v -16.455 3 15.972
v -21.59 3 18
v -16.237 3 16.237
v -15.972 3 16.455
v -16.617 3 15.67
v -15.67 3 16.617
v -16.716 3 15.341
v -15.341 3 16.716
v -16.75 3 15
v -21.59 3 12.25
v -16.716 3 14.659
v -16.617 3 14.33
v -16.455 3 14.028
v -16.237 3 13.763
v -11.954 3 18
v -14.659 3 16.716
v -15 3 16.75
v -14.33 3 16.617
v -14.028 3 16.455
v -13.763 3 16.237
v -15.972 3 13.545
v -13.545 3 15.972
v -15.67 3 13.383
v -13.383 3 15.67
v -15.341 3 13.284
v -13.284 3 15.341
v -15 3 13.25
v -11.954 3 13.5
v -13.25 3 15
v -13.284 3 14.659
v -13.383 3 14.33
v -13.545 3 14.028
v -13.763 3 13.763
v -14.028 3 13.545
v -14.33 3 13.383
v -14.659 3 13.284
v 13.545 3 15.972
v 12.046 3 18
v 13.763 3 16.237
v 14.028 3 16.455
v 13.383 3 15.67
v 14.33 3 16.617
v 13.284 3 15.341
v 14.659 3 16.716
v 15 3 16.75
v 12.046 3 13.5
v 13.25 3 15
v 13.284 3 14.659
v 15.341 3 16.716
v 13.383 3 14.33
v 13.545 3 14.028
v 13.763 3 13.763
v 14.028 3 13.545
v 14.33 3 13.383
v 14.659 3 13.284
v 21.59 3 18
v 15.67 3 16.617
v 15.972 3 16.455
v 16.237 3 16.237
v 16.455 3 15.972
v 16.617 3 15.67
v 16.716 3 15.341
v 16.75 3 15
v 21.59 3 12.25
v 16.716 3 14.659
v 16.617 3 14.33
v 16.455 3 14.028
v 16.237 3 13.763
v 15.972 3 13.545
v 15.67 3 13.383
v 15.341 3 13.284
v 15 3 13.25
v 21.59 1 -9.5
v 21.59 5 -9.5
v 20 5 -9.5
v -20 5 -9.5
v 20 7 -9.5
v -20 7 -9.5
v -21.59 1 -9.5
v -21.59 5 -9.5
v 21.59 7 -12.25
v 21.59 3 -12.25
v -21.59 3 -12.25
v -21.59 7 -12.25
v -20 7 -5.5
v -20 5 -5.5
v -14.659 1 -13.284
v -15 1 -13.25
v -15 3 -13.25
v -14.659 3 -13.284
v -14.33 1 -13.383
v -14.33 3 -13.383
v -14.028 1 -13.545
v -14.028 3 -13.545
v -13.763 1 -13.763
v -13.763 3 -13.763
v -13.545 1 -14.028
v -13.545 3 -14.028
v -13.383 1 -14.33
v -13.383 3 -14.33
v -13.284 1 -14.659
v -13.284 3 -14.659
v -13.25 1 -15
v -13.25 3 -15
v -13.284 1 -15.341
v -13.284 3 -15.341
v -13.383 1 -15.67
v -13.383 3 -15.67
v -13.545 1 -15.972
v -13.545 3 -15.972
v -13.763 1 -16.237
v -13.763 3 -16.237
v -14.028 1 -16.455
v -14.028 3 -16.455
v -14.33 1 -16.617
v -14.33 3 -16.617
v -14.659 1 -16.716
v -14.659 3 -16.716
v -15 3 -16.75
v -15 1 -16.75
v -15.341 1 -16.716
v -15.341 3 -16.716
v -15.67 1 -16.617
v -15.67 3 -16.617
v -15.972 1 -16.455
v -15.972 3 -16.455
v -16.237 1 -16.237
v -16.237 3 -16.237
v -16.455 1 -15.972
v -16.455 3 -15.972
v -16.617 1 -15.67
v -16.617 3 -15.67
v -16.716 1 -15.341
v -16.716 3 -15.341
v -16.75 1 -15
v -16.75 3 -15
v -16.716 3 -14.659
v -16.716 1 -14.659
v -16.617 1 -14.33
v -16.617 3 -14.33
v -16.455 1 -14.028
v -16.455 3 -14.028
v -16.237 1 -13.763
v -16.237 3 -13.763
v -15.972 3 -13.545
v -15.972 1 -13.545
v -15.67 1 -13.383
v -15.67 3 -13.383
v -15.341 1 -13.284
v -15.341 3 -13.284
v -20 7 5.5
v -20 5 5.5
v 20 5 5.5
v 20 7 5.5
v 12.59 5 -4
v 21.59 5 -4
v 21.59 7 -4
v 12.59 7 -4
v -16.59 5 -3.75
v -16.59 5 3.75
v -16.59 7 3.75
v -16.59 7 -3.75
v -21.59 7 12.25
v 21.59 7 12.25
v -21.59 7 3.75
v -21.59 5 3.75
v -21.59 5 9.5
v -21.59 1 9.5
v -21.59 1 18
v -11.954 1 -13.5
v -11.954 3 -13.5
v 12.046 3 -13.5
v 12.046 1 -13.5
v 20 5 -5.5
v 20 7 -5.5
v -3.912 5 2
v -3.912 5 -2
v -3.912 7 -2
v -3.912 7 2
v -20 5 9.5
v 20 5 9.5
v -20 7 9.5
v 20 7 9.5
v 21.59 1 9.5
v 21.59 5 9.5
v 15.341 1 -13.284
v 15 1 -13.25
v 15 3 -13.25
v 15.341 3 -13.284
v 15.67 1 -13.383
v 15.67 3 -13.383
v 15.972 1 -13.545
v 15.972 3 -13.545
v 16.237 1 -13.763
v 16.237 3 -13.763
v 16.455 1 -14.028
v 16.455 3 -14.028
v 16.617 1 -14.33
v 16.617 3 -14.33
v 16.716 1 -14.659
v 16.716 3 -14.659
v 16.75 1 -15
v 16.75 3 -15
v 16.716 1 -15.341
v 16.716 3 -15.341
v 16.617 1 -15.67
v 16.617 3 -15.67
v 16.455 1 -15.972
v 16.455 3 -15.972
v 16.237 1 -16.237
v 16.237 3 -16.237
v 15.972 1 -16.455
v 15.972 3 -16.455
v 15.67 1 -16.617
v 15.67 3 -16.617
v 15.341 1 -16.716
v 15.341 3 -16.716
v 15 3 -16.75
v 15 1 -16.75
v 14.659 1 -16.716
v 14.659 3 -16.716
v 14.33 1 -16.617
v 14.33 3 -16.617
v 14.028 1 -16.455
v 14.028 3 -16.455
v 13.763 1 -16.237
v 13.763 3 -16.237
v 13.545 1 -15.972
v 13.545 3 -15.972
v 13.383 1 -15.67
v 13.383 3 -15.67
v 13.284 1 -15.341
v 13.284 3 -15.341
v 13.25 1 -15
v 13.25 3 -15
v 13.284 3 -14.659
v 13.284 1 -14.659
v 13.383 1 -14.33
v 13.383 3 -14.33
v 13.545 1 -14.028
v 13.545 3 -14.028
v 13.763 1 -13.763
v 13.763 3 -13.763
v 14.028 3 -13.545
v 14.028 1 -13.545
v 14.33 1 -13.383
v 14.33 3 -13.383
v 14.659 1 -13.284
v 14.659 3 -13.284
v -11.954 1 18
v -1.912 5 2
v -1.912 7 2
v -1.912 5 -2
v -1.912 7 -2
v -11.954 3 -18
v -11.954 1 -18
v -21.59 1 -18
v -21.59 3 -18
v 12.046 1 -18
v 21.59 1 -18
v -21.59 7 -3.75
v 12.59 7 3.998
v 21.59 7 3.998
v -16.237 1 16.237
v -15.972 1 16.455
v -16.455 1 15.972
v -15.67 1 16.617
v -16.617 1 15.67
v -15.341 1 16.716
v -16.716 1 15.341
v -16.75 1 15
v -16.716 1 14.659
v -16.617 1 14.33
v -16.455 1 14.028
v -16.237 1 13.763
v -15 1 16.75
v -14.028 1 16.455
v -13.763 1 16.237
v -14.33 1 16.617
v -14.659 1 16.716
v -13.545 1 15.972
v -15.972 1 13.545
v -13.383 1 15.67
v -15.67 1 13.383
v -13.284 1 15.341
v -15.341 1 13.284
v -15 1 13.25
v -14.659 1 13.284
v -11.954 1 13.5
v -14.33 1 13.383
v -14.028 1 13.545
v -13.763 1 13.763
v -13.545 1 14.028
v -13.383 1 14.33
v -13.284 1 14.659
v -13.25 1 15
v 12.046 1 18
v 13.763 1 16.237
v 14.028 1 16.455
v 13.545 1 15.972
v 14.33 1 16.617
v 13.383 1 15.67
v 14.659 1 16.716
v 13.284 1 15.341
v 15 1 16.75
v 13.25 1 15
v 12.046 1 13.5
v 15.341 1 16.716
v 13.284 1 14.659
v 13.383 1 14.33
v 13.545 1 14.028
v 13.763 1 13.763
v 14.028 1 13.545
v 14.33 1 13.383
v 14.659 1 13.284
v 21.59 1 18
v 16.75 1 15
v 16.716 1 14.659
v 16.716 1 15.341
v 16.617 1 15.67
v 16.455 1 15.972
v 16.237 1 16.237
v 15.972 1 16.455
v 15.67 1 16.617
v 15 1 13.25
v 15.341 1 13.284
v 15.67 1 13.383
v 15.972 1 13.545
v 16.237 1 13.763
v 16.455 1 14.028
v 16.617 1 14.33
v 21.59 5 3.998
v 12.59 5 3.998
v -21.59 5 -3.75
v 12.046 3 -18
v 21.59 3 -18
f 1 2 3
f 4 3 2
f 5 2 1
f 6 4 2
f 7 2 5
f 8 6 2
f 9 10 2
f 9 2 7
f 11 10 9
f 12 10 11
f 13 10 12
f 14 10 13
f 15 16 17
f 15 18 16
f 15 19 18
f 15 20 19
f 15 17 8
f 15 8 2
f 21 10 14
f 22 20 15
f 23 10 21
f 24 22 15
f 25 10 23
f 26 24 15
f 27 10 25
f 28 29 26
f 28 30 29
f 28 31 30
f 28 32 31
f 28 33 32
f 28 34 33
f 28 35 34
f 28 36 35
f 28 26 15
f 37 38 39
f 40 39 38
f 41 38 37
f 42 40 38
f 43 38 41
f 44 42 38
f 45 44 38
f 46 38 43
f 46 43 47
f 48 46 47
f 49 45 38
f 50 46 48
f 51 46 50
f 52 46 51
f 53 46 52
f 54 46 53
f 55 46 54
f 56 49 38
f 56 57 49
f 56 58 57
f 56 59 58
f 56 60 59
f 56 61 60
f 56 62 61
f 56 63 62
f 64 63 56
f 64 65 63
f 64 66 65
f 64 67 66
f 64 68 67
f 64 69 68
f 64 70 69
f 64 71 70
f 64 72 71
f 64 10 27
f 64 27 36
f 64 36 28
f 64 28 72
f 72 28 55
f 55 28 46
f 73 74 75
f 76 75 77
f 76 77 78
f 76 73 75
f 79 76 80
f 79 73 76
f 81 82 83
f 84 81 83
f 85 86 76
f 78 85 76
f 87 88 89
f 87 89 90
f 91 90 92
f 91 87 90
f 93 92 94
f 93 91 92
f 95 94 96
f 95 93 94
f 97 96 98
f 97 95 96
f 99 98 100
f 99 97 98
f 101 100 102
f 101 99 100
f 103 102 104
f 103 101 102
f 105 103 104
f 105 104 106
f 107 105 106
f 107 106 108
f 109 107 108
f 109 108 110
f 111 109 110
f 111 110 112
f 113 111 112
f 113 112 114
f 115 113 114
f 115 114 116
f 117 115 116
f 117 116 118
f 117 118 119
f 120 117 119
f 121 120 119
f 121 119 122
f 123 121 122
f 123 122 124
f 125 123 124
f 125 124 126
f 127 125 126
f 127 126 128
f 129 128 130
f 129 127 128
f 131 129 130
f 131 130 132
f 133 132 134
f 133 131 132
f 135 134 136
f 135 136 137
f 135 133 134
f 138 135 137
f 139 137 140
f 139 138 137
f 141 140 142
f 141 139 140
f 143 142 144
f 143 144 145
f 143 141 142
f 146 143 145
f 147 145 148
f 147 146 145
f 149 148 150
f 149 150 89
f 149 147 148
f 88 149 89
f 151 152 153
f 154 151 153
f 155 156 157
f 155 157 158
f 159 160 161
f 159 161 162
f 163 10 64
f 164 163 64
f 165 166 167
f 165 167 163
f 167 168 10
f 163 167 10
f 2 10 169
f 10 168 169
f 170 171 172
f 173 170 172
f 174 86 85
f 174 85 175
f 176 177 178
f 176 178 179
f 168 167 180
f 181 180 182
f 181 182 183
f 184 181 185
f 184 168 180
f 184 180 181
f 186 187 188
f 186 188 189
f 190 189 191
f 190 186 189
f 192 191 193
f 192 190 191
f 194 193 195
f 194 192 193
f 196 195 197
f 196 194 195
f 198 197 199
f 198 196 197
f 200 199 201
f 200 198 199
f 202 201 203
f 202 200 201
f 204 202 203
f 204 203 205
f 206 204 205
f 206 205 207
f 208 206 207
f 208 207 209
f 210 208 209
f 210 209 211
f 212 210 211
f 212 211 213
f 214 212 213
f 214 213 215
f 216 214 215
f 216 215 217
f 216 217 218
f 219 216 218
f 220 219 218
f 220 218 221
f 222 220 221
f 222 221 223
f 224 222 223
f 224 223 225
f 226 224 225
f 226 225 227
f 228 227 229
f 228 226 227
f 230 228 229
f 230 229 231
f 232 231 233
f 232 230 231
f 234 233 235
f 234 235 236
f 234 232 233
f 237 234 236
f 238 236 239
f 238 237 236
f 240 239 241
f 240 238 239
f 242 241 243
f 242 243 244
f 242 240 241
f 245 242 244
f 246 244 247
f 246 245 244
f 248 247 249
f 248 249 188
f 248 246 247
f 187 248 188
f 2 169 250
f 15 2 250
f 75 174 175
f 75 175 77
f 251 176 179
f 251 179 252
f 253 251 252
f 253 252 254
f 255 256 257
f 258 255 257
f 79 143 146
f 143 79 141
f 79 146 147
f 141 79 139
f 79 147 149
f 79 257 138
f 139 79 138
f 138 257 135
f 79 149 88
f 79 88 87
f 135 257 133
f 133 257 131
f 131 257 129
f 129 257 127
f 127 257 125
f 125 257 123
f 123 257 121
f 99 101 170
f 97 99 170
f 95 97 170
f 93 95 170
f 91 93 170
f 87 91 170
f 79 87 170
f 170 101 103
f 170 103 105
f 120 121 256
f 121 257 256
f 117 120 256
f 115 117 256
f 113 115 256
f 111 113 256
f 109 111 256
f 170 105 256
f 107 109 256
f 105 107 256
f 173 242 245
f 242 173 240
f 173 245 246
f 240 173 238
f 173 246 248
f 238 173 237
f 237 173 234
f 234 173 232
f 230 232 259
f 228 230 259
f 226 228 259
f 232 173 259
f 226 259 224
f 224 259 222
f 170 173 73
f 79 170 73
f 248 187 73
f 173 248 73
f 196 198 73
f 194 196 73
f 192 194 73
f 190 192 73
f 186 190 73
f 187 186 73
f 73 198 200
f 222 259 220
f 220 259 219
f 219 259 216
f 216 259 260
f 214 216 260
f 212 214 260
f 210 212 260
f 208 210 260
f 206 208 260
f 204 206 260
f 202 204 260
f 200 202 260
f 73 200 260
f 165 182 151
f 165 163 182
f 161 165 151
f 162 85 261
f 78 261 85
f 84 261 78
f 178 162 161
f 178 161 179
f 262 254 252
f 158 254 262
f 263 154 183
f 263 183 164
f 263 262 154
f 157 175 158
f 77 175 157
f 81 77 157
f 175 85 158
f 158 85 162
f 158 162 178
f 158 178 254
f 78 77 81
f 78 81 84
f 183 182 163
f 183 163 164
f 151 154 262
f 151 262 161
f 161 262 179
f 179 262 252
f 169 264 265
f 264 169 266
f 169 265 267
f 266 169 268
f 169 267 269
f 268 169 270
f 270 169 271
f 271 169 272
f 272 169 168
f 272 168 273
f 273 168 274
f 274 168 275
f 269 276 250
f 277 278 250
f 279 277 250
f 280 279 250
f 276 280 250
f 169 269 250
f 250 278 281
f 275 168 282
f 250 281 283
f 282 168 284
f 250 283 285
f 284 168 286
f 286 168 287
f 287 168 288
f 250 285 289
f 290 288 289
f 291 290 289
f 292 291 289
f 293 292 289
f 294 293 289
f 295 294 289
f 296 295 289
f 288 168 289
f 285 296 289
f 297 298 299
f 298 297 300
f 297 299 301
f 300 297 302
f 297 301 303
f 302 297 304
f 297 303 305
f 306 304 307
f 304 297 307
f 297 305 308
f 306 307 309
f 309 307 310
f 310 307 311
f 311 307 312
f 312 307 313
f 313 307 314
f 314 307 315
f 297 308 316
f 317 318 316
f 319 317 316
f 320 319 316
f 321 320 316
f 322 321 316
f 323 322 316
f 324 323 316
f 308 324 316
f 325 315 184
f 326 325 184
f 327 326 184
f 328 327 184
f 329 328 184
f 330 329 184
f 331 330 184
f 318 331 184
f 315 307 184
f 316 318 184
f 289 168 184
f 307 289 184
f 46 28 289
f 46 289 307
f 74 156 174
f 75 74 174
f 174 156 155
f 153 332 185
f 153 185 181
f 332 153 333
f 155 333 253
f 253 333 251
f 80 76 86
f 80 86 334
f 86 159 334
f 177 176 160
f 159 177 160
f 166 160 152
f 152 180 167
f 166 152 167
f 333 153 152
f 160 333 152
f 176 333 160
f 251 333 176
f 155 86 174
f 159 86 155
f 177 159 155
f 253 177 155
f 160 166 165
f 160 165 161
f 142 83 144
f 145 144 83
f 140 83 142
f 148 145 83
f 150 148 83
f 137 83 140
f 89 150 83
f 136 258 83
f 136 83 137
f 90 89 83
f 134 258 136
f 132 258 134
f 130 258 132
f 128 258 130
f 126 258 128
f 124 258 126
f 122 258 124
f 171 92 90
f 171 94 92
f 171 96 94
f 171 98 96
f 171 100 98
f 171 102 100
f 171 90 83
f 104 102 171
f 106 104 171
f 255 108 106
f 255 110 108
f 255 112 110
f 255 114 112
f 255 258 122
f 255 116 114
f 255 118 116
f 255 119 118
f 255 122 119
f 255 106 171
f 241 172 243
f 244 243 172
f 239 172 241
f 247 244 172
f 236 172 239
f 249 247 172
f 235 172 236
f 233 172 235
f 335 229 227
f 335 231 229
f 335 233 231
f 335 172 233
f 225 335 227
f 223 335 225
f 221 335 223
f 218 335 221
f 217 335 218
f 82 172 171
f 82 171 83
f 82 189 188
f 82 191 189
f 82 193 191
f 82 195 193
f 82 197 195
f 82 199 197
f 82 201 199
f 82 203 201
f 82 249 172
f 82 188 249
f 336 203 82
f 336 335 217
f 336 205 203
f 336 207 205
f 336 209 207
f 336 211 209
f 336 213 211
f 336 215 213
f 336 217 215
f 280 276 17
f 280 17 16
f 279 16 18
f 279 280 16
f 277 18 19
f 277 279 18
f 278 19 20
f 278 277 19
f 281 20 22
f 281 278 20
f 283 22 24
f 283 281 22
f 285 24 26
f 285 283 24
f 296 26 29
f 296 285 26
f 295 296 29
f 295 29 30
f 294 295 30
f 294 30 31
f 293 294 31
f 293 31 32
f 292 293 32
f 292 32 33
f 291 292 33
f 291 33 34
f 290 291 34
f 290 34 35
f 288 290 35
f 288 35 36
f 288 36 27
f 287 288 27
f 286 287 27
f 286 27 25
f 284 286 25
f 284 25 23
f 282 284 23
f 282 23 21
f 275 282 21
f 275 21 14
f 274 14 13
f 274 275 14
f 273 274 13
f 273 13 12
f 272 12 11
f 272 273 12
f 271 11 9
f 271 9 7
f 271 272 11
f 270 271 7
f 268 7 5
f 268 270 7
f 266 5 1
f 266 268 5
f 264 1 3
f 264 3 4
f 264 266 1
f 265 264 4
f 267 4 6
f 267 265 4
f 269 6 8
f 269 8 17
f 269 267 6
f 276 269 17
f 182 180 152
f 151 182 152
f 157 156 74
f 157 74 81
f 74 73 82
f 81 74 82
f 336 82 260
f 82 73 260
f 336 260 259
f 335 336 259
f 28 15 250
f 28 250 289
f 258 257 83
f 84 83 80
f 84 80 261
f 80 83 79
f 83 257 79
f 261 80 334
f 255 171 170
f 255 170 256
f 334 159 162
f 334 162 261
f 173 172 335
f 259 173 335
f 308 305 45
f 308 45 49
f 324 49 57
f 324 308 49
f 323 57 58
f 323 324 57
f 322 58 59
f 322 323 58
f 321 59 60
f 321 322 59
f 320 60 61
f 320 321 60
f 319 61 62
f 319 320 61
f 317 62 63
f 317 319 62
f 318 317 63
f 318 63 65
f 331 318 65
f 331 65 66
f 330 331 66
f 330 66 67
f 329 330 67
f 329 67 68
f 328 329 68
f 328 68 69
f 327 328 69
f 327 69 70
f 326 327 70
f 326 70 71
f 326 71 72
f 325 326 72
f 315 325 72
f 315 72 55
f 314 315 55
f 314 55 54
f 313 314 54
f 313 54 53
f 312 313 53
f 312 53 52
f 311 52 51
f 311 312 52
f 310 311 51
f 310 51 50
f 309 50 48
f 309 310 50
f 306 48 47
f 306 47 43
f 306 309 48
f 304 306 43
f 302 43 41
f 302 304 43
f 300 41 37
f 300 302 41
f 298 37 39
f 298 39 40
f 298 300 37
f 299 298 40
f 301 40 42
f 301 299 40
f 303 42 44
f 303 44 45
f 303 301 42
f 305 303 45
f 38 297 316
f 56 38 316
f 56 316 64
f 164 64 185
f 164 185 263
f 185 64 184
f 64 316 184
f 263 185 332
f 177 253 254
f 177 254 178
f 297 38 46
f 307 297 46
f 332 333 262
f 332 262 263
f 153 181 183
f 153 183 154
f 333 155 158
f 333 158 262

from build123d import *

# Parameters (mm, degrees)
SKETCH1_R               = 1.75
BOSS_EXTRUDE3_DEPTH     = 3
SKETCH4_W               = 38.009499712
SKETCH4_H               = 2.5
CUT_EXTRUDE7_DEPTH      = 29.268853886
SKETCH7_W               = 36
SKETCH7_H               = 1
CUT_EXTRUDE8_DEPTH      = 47.877632193
SKETCH9_W               = 39.982004405
SKETCH9_H               = 3.901650926
SKETCH9_W_2             = 38.509499712
SKETCH9_H_2             = 2.8
SKETCH9_W_3             = 37.982004405
SKETCH9_H_3             = 0.55
CUT_EXTRUDE9_DEPTH      = 10
SKETCH10_W              = 40
SKETCH10_H              = 4
SKETCH10_W_2            = 39.982004405
SKETCH10_H_2            = 3.901650926
CUT_EXTRUDE11_DEPTH     = 29.180278565
SKETCH11_W              = 20
SKETCH11_H              = 3.116121774
CUT_EXTRUDE12_DEPTH     = 10
SKETCH12_W              = 2
SKETCH12_H              = 8.5
CUT_EXTRUDE15_DEPTH     = 10
CROQUIS1_W              = 24
CROQUIS1_H              = 4
SALIENTE_EXTRUIR1_DEPTH = 2
CROQUIS2_W              = 40
CROQUIS2_H              = 4
SALIENTE_EXTRUIR2_DEPTH = 4
CORTAR_EXTRUIR2_DEPTH   = 4
SKETCH3_W               = 9
SKETCH3_H               = 3.998143652
CORTAR_EXTRUIR5_DEPTH   = 4


with BuildPart() as part:
    # Sketch1 → Boss-Extrude3 (new body)
    # profile 1 of 2: a face of its own
    with BuildSketch(Plane(origin=(0, 0, 0), x_dir=(1, 0, 0), z_dir=(0, 1, 0))):
        Polygon((-21.59, 18), (-21.59, 0), (0, 0), (21.59, 0), (21.59, 18), (18.04585781, 18), (10.04585781, 18), (10.04585781, 12.616121774), (-9.95414219, 12.616121774), (-9.95414219, 18), (-17.95414219, 18), align=None)
        with Locations(Location((-15, 15, 0), (0, 0, 270))):
            Circle(SKETCH1_R, mode=Mode.SUBTRACT)
        Polygon((18.504745017, 6.25), (0, 6.25), (-18.5, 6.25), (-19.004539265, 6.25), (-19.004539265, 8.75), (-18.5, 8.75), (0.002372509, 8.75), (18.504745017, 8.75), (19.004960447, 8.75), (19.004960447, 6.25), align=None, mode=Mode.SUBTRACT)
        with Locations(Location((15, 15, 0), (0, 0, 270))):
            Circle(SKETCH1_R, mode=Mode.SUBTRACT)
    # profile 2 of 2: a face of its own
    with BuildSketch(Plane(origin=(0, 0, 0), x_dir=(1, 0, 0), z_dir=(0, 1, 0))):
        Polygon((0, 0), (-21.59, 0), (-21.59, -18), (-17.95414219, -18), (-9.95414219, -18), (-9.95414219, -12.616121774), (10.04585781, -12.616121774), (10.04585781, -18), (18.04585781, -18), (21.59, -18), (21.59, 0), align=None)
        with Locations(Location((-15, -15, 0), (0, 0, 270))):
            Circle(SKETCH1_R, mode=Mode.SUBTRACT)
        with Locations(Location((15, -15, 0), (0, 0, 270))):
            Circle(SKETCH1_R, mode=Mode.SUBTRACT)
        Polygon((18.504745017, -6.25), (19.004960447, -6.25), (19.004960447, -8.75), (18.504745017, -8.75), (-18.5, -8.75), (-19.004539265, -8.75), (-19.004539265, -6.25), (-18.5, -6.25), align=None, mode=Mode.SUBTRACT)
    extrude(amount=BOSS_EXTRUDE3_DEPTH)

    # Sketch4 → Cut-Extrude7 (cut, through all)
    # profile 1 of 3: a face of its own
    with BuildSketch(Plane(origin=(0, 3, 0), x_dir=(1, 0, 0), z_dir=(0, 1, 0))):
        Polygon((19.004960447, 6.1), (19.254960447, 6.1), (19.254960447, 8.882786661), (19.254960447, 8.9), (19.004960447, 8.9), (-19.004539265, 8.9), (-19.254539265, 8.9), (-19.254539265, 6.1), (-19.004539265, 6.1), align=None)
        with Locations((0.000210591, 7.5)):
            Rectangle(SKETCH4_W, SKETCH4_H, mode=Mode.SUBTRACT)
    # profile 2 of 3: a face of its own
    with BuildSketch(Plane(origin=(0, 3, 0), x_dir=(1, 0, 0), z_dir=(0, 1, 0))):
        with Locations((0.000210591, 7.5)):
            Rectangle(SKETCH4_W, SKETCH4_H)
    # profile 3 of 3: a face of its own
    with BuildSketch(Plane(origin=(0, 3, 0), x_dir=(1, 0, 0), z_dir=(0, 1, 0))):
        Polygon((-19.254539265, -6.1), (-19.254539265, -8.9), (-19.004539265, -8.9), (19.004960447, -8.9), (19.254960447, -8.9), (19.254960447, -6.1), (19.004960447, -6.1), (-19.004539265, -6.1), align=None)
        with Locations((0.000210591, -7.5)):
            Rectangle(SKETCH4_W, SKETCH4_H, mode=Mode.SUBTRACT)
    extrude(amount=-CUT_EXTRUDE7_DEPTH, mode=Mode.SUBTRACT)

    # Sketch7 → Cut-Extrude8 (cut, through all)
    with BuildSketch(Plane(origin=(21.59, 0, 0), x_dir=(0, 0, -1), z_dir=(1, 0, 0))):
        with Locations((0, 0.5)):
            Rectangle(SKETCH7_W, SKETCH7_H)
    extrude(amount=-CUT_EXTRUDE8_DEPTH, mode=Mode.SUBTRACT)

    # Sketch9 → Cut-Extrude9 (cut)
    # profile 1 of 4: a face of its own
    with BuildSketch(Plane(origin=(0, 3, 0), x_dir=(1, 0, 0), z_dir=(0, 1, 0))):
        with Locations((0.000210592, 7.5)):
            Rectangle(SKETCH9_W, SKETCH9_H)
        with Locations((0.000210591, 7.5)):
            Rectangle(SKETCH9_W_2, SKETCH9_H_2, mode=Mode.SUBTRACT)
    # profile 2 of 4: a face of its own
    with BuildSketch(Plane(origin=(0, 3, 0), x_dir=(1, 0, 0), z_dir=(0, 1, 0))):
        with Locations((0.000210592, -7.5)):
            Rectangle(SKETCH9_W, SKETCH9_H)
        Polygon((-19.254539265, -8.9), (-19.254539265, -6.1), (-18.990791611, -6.1), (-18.990791611, -5.55), (18.991212794, -5.55), (18.991212794, -6.1), (19.254960447, -6.1), (19.254960447, -8.9), (18.991212794, -8.9), (18.991212794, -9.45), (-18.990791611, -9.45), (-18.990791611, -8.9), align=None, mode=Mode.SUBTRACT)
    # profile 3 of 4: a face of its own
    with BuildSketch(Plane(origin=(0, 3, 0), x_dir=(1, 0, 0), z_dir=(0, 1, 0))):
        with Locations((0.000210592, -5.825)):
            Rectangle(SKETCH9_W_3, SKETCH9_H_3)
    # profile 4 of 4: a face of its own
    with BuildSketch(Plane(origin=(0, 3, 0), x_dir=(1, 0, 0), z_dir=(0, 1, 0))):
        with Locations((0.000210592, -9.175)):
            Rectangle(SKETCH9_W_3, SKETCH9_H_3)
    extrude(amount=-CUT_EXTRUDE9_DEPTH, mode=Mode.SUBTRACT)

    # Sketch10 → Cut-Extrude11 (cut, through all)
    # profile 1 of 3: a face of its own
    with BuildSketch(Plane(origin=(0, 3, 0), x_dir=(1, 0, 0), z_dir=(0, 1, 0))):
        with Locations((0.000210591, -7.5)):
            Rectangle(SKETCH10_W, SKETCH10_H)
        with Locations((0.000210592, -7.5)):
            Rectangle(SKETCH10_W_2, SKETCH10_H_2, mode=Mode.SUBTRACT)
    # profile 2 of 3: a face of its own
    with BuildSketch(Plane(origin=(0, 3, 0), x_dir=(1, 0, 0), z_dir=(0, 1, 0))):
        with Locations((0.000210591, 7.5)):
            Rectangle(SKETCH10_W, SKETCH10_H)
        with Locations((0.000210592, 7.5)):
            Rectangle(SKETCH10_W_2, SKETCH10_H_2, mode=Mode.SUBTRACT)
    # profile 3 of 3: a face of its own
    with BuildSketch(Plane(origin=(0, 3, 0), x_dir=(1, 0, 0), z_dir=(0, 1, 0))):
        with Locations((0.000210592, 7.5)):
            Rectangle(SKETCH10_W_2, SKETCH10_H_2)
    extrude(amount=-CUT_EXTRUDE11_DEPTH, mode=Mode.SUBTRACT)

    # Sketch11 → Cut-Extrude12 (cut)
    with BuildSketch(Plane(origin=(0, 3, 0), x_dir=(1, 0, 0), z_dir=(0, 1, 0))):
        with Locations((0.04585781, -11.058060887)):
            Rectangle(SKETCH11_W, SKETCH11_H)
        with Locations((0.04585781, 11.058060887)):
            Rectangle(SKETCH11_W, SKETCH11_H)
    extrude(amount=-CUT_EXTRUDE12_DEPTH, mode=Mode.SUBTRACT)

    # Sketch12 → Cut-Extrude15 (cut)
    with BuildSketch(Plane(origin=(0, 3, 0), x_dir=(1, 0, 0), z_dir=(0, 1, 0))):
        with Locations((-10.95414219, -13.75)):
            Rectangle(SKETCH12_W, SKETCH12_H)
        with Locations((-10.95414219, 13.75)):
            Rectangle(SKETCH12_W, SKETCH12_H)
        with Locations((11.04585781, 13.75)):
            Rectangle(SKETCH12_W, SKETCH12_H)
        Polygon((10.04585781, -9.65592739), (10.04585781, -18), (12.04585781, -18), (12.04585781, -9.65592739), (12.04585781, -9.5), (10.04585781, -9.5), align=None)
    extrude(amount=-CUT_EXTRUDE15_DEPTH, mode=Mode.SUBTRACT)

    # Croquis1 → Saliente-Extruir1 (add)
    with BuildSketch(Plane(origin=(0, 3, 0), x_dir=(1, 0, 0), z_dir=(0, 1, 0))):
        with Locations((0.04585781, -11.5)):
            Rectangle(CROQUIS1_W, CROQUIS1_H)
        with Locations((0.04585781, 11.5)):
            Rectangle(CROQUIS1_W, CROQUIS1_H)
    extrude(amount=-SALIENTE_EXTRUIR1_DEPTH)

    # Croquis2 → Saliente-Extruir2 (add)
    with BuildSketch(Plane(origin=(0, 3, 0), x_dir=(1, 0, 0), z_dir=(0, 1, 0))):
        Polygon((21.59, 9.27), (21.59, 12.25), (-21.59, 12.25), (-21.59, 9.27), (-21.59, -9.27), (-21.59, -12.25), (21.59, -12.25), (21.59, -9.27), align=None)
        with Locations((0.000210591, -7.5)):
            Rectangle(CROQUIS2_W, CROQUIS2_H, mode=Mode.SUBTRACT)
        with Locations((0.000210591, 7.5)):
            Rectangle(CROQUIS2_W, CROQUIS2_H, mode=Mode.SUBTRACT)
    extrude(amount=SALIENTE_EXTRUIR2_DEPTH)

    # Croquis4 → Cortar-Extruir2 (cut)
    with BuildSketch(Plane.XZ.offset(-1)):
        Polygon((-21.59, -9.5), (-21.59, 9.5), (-19.999789409, 9.5), (-19.999789409, 5.5), (20.000210591, 5.5), (20.000210591, 9.5), (21.59, 9.5), (21.59, -9.5), (20.000210591, -9.5), (20.000210591, -5.5), (-19.999789409, -5.5), (-19.999789409, -9.5), align=None)
    extrude(amount=-CORTAR_EXTRUIR2_DEPTH, mode=Mode.SUBTRACT)

    # Sketch3 → Cortar-Extruir5 (cut)
    with BuildSketch(Plane(origin=(0, 3, 0), x_dir=(1, 0, 0), z_dir=(0, 1, 0))):
        Polygon((-1.911780511, -2), (-1.911780511, 0), (-3.40804733, 0), (-3.911780511, 0), (-3.911780511, -0.084828213), (-3.911780511, -2), align=None)
        Polygon((-3.40804733, 0), (-1.911780511, 0), (-1.911780511, 2), (-3.911780511, 2), (-3.911780511, 0), align=None)
        Polygon((12.59, 0.000697543), (12.59, 0), (21.59, 0), (21.59, 3.999538738), (12.59, 3.999538738), align=None)
        with Locations((17.09, -1.999071826)):
            Rectangle(SKETCH3_W, SKETCH3_H)
        Polygon((-16.59, -3.75), (-16.59, 0), (-16.59, 3.75), (-21.59, 3.75), (-21.59, 0), (-21.59, -3.75), align=None)
    extrude(amount=CORTAR_EXTRUIR5_DEPTH, mode=Mode.SUBTRACT)


solid = part.part
